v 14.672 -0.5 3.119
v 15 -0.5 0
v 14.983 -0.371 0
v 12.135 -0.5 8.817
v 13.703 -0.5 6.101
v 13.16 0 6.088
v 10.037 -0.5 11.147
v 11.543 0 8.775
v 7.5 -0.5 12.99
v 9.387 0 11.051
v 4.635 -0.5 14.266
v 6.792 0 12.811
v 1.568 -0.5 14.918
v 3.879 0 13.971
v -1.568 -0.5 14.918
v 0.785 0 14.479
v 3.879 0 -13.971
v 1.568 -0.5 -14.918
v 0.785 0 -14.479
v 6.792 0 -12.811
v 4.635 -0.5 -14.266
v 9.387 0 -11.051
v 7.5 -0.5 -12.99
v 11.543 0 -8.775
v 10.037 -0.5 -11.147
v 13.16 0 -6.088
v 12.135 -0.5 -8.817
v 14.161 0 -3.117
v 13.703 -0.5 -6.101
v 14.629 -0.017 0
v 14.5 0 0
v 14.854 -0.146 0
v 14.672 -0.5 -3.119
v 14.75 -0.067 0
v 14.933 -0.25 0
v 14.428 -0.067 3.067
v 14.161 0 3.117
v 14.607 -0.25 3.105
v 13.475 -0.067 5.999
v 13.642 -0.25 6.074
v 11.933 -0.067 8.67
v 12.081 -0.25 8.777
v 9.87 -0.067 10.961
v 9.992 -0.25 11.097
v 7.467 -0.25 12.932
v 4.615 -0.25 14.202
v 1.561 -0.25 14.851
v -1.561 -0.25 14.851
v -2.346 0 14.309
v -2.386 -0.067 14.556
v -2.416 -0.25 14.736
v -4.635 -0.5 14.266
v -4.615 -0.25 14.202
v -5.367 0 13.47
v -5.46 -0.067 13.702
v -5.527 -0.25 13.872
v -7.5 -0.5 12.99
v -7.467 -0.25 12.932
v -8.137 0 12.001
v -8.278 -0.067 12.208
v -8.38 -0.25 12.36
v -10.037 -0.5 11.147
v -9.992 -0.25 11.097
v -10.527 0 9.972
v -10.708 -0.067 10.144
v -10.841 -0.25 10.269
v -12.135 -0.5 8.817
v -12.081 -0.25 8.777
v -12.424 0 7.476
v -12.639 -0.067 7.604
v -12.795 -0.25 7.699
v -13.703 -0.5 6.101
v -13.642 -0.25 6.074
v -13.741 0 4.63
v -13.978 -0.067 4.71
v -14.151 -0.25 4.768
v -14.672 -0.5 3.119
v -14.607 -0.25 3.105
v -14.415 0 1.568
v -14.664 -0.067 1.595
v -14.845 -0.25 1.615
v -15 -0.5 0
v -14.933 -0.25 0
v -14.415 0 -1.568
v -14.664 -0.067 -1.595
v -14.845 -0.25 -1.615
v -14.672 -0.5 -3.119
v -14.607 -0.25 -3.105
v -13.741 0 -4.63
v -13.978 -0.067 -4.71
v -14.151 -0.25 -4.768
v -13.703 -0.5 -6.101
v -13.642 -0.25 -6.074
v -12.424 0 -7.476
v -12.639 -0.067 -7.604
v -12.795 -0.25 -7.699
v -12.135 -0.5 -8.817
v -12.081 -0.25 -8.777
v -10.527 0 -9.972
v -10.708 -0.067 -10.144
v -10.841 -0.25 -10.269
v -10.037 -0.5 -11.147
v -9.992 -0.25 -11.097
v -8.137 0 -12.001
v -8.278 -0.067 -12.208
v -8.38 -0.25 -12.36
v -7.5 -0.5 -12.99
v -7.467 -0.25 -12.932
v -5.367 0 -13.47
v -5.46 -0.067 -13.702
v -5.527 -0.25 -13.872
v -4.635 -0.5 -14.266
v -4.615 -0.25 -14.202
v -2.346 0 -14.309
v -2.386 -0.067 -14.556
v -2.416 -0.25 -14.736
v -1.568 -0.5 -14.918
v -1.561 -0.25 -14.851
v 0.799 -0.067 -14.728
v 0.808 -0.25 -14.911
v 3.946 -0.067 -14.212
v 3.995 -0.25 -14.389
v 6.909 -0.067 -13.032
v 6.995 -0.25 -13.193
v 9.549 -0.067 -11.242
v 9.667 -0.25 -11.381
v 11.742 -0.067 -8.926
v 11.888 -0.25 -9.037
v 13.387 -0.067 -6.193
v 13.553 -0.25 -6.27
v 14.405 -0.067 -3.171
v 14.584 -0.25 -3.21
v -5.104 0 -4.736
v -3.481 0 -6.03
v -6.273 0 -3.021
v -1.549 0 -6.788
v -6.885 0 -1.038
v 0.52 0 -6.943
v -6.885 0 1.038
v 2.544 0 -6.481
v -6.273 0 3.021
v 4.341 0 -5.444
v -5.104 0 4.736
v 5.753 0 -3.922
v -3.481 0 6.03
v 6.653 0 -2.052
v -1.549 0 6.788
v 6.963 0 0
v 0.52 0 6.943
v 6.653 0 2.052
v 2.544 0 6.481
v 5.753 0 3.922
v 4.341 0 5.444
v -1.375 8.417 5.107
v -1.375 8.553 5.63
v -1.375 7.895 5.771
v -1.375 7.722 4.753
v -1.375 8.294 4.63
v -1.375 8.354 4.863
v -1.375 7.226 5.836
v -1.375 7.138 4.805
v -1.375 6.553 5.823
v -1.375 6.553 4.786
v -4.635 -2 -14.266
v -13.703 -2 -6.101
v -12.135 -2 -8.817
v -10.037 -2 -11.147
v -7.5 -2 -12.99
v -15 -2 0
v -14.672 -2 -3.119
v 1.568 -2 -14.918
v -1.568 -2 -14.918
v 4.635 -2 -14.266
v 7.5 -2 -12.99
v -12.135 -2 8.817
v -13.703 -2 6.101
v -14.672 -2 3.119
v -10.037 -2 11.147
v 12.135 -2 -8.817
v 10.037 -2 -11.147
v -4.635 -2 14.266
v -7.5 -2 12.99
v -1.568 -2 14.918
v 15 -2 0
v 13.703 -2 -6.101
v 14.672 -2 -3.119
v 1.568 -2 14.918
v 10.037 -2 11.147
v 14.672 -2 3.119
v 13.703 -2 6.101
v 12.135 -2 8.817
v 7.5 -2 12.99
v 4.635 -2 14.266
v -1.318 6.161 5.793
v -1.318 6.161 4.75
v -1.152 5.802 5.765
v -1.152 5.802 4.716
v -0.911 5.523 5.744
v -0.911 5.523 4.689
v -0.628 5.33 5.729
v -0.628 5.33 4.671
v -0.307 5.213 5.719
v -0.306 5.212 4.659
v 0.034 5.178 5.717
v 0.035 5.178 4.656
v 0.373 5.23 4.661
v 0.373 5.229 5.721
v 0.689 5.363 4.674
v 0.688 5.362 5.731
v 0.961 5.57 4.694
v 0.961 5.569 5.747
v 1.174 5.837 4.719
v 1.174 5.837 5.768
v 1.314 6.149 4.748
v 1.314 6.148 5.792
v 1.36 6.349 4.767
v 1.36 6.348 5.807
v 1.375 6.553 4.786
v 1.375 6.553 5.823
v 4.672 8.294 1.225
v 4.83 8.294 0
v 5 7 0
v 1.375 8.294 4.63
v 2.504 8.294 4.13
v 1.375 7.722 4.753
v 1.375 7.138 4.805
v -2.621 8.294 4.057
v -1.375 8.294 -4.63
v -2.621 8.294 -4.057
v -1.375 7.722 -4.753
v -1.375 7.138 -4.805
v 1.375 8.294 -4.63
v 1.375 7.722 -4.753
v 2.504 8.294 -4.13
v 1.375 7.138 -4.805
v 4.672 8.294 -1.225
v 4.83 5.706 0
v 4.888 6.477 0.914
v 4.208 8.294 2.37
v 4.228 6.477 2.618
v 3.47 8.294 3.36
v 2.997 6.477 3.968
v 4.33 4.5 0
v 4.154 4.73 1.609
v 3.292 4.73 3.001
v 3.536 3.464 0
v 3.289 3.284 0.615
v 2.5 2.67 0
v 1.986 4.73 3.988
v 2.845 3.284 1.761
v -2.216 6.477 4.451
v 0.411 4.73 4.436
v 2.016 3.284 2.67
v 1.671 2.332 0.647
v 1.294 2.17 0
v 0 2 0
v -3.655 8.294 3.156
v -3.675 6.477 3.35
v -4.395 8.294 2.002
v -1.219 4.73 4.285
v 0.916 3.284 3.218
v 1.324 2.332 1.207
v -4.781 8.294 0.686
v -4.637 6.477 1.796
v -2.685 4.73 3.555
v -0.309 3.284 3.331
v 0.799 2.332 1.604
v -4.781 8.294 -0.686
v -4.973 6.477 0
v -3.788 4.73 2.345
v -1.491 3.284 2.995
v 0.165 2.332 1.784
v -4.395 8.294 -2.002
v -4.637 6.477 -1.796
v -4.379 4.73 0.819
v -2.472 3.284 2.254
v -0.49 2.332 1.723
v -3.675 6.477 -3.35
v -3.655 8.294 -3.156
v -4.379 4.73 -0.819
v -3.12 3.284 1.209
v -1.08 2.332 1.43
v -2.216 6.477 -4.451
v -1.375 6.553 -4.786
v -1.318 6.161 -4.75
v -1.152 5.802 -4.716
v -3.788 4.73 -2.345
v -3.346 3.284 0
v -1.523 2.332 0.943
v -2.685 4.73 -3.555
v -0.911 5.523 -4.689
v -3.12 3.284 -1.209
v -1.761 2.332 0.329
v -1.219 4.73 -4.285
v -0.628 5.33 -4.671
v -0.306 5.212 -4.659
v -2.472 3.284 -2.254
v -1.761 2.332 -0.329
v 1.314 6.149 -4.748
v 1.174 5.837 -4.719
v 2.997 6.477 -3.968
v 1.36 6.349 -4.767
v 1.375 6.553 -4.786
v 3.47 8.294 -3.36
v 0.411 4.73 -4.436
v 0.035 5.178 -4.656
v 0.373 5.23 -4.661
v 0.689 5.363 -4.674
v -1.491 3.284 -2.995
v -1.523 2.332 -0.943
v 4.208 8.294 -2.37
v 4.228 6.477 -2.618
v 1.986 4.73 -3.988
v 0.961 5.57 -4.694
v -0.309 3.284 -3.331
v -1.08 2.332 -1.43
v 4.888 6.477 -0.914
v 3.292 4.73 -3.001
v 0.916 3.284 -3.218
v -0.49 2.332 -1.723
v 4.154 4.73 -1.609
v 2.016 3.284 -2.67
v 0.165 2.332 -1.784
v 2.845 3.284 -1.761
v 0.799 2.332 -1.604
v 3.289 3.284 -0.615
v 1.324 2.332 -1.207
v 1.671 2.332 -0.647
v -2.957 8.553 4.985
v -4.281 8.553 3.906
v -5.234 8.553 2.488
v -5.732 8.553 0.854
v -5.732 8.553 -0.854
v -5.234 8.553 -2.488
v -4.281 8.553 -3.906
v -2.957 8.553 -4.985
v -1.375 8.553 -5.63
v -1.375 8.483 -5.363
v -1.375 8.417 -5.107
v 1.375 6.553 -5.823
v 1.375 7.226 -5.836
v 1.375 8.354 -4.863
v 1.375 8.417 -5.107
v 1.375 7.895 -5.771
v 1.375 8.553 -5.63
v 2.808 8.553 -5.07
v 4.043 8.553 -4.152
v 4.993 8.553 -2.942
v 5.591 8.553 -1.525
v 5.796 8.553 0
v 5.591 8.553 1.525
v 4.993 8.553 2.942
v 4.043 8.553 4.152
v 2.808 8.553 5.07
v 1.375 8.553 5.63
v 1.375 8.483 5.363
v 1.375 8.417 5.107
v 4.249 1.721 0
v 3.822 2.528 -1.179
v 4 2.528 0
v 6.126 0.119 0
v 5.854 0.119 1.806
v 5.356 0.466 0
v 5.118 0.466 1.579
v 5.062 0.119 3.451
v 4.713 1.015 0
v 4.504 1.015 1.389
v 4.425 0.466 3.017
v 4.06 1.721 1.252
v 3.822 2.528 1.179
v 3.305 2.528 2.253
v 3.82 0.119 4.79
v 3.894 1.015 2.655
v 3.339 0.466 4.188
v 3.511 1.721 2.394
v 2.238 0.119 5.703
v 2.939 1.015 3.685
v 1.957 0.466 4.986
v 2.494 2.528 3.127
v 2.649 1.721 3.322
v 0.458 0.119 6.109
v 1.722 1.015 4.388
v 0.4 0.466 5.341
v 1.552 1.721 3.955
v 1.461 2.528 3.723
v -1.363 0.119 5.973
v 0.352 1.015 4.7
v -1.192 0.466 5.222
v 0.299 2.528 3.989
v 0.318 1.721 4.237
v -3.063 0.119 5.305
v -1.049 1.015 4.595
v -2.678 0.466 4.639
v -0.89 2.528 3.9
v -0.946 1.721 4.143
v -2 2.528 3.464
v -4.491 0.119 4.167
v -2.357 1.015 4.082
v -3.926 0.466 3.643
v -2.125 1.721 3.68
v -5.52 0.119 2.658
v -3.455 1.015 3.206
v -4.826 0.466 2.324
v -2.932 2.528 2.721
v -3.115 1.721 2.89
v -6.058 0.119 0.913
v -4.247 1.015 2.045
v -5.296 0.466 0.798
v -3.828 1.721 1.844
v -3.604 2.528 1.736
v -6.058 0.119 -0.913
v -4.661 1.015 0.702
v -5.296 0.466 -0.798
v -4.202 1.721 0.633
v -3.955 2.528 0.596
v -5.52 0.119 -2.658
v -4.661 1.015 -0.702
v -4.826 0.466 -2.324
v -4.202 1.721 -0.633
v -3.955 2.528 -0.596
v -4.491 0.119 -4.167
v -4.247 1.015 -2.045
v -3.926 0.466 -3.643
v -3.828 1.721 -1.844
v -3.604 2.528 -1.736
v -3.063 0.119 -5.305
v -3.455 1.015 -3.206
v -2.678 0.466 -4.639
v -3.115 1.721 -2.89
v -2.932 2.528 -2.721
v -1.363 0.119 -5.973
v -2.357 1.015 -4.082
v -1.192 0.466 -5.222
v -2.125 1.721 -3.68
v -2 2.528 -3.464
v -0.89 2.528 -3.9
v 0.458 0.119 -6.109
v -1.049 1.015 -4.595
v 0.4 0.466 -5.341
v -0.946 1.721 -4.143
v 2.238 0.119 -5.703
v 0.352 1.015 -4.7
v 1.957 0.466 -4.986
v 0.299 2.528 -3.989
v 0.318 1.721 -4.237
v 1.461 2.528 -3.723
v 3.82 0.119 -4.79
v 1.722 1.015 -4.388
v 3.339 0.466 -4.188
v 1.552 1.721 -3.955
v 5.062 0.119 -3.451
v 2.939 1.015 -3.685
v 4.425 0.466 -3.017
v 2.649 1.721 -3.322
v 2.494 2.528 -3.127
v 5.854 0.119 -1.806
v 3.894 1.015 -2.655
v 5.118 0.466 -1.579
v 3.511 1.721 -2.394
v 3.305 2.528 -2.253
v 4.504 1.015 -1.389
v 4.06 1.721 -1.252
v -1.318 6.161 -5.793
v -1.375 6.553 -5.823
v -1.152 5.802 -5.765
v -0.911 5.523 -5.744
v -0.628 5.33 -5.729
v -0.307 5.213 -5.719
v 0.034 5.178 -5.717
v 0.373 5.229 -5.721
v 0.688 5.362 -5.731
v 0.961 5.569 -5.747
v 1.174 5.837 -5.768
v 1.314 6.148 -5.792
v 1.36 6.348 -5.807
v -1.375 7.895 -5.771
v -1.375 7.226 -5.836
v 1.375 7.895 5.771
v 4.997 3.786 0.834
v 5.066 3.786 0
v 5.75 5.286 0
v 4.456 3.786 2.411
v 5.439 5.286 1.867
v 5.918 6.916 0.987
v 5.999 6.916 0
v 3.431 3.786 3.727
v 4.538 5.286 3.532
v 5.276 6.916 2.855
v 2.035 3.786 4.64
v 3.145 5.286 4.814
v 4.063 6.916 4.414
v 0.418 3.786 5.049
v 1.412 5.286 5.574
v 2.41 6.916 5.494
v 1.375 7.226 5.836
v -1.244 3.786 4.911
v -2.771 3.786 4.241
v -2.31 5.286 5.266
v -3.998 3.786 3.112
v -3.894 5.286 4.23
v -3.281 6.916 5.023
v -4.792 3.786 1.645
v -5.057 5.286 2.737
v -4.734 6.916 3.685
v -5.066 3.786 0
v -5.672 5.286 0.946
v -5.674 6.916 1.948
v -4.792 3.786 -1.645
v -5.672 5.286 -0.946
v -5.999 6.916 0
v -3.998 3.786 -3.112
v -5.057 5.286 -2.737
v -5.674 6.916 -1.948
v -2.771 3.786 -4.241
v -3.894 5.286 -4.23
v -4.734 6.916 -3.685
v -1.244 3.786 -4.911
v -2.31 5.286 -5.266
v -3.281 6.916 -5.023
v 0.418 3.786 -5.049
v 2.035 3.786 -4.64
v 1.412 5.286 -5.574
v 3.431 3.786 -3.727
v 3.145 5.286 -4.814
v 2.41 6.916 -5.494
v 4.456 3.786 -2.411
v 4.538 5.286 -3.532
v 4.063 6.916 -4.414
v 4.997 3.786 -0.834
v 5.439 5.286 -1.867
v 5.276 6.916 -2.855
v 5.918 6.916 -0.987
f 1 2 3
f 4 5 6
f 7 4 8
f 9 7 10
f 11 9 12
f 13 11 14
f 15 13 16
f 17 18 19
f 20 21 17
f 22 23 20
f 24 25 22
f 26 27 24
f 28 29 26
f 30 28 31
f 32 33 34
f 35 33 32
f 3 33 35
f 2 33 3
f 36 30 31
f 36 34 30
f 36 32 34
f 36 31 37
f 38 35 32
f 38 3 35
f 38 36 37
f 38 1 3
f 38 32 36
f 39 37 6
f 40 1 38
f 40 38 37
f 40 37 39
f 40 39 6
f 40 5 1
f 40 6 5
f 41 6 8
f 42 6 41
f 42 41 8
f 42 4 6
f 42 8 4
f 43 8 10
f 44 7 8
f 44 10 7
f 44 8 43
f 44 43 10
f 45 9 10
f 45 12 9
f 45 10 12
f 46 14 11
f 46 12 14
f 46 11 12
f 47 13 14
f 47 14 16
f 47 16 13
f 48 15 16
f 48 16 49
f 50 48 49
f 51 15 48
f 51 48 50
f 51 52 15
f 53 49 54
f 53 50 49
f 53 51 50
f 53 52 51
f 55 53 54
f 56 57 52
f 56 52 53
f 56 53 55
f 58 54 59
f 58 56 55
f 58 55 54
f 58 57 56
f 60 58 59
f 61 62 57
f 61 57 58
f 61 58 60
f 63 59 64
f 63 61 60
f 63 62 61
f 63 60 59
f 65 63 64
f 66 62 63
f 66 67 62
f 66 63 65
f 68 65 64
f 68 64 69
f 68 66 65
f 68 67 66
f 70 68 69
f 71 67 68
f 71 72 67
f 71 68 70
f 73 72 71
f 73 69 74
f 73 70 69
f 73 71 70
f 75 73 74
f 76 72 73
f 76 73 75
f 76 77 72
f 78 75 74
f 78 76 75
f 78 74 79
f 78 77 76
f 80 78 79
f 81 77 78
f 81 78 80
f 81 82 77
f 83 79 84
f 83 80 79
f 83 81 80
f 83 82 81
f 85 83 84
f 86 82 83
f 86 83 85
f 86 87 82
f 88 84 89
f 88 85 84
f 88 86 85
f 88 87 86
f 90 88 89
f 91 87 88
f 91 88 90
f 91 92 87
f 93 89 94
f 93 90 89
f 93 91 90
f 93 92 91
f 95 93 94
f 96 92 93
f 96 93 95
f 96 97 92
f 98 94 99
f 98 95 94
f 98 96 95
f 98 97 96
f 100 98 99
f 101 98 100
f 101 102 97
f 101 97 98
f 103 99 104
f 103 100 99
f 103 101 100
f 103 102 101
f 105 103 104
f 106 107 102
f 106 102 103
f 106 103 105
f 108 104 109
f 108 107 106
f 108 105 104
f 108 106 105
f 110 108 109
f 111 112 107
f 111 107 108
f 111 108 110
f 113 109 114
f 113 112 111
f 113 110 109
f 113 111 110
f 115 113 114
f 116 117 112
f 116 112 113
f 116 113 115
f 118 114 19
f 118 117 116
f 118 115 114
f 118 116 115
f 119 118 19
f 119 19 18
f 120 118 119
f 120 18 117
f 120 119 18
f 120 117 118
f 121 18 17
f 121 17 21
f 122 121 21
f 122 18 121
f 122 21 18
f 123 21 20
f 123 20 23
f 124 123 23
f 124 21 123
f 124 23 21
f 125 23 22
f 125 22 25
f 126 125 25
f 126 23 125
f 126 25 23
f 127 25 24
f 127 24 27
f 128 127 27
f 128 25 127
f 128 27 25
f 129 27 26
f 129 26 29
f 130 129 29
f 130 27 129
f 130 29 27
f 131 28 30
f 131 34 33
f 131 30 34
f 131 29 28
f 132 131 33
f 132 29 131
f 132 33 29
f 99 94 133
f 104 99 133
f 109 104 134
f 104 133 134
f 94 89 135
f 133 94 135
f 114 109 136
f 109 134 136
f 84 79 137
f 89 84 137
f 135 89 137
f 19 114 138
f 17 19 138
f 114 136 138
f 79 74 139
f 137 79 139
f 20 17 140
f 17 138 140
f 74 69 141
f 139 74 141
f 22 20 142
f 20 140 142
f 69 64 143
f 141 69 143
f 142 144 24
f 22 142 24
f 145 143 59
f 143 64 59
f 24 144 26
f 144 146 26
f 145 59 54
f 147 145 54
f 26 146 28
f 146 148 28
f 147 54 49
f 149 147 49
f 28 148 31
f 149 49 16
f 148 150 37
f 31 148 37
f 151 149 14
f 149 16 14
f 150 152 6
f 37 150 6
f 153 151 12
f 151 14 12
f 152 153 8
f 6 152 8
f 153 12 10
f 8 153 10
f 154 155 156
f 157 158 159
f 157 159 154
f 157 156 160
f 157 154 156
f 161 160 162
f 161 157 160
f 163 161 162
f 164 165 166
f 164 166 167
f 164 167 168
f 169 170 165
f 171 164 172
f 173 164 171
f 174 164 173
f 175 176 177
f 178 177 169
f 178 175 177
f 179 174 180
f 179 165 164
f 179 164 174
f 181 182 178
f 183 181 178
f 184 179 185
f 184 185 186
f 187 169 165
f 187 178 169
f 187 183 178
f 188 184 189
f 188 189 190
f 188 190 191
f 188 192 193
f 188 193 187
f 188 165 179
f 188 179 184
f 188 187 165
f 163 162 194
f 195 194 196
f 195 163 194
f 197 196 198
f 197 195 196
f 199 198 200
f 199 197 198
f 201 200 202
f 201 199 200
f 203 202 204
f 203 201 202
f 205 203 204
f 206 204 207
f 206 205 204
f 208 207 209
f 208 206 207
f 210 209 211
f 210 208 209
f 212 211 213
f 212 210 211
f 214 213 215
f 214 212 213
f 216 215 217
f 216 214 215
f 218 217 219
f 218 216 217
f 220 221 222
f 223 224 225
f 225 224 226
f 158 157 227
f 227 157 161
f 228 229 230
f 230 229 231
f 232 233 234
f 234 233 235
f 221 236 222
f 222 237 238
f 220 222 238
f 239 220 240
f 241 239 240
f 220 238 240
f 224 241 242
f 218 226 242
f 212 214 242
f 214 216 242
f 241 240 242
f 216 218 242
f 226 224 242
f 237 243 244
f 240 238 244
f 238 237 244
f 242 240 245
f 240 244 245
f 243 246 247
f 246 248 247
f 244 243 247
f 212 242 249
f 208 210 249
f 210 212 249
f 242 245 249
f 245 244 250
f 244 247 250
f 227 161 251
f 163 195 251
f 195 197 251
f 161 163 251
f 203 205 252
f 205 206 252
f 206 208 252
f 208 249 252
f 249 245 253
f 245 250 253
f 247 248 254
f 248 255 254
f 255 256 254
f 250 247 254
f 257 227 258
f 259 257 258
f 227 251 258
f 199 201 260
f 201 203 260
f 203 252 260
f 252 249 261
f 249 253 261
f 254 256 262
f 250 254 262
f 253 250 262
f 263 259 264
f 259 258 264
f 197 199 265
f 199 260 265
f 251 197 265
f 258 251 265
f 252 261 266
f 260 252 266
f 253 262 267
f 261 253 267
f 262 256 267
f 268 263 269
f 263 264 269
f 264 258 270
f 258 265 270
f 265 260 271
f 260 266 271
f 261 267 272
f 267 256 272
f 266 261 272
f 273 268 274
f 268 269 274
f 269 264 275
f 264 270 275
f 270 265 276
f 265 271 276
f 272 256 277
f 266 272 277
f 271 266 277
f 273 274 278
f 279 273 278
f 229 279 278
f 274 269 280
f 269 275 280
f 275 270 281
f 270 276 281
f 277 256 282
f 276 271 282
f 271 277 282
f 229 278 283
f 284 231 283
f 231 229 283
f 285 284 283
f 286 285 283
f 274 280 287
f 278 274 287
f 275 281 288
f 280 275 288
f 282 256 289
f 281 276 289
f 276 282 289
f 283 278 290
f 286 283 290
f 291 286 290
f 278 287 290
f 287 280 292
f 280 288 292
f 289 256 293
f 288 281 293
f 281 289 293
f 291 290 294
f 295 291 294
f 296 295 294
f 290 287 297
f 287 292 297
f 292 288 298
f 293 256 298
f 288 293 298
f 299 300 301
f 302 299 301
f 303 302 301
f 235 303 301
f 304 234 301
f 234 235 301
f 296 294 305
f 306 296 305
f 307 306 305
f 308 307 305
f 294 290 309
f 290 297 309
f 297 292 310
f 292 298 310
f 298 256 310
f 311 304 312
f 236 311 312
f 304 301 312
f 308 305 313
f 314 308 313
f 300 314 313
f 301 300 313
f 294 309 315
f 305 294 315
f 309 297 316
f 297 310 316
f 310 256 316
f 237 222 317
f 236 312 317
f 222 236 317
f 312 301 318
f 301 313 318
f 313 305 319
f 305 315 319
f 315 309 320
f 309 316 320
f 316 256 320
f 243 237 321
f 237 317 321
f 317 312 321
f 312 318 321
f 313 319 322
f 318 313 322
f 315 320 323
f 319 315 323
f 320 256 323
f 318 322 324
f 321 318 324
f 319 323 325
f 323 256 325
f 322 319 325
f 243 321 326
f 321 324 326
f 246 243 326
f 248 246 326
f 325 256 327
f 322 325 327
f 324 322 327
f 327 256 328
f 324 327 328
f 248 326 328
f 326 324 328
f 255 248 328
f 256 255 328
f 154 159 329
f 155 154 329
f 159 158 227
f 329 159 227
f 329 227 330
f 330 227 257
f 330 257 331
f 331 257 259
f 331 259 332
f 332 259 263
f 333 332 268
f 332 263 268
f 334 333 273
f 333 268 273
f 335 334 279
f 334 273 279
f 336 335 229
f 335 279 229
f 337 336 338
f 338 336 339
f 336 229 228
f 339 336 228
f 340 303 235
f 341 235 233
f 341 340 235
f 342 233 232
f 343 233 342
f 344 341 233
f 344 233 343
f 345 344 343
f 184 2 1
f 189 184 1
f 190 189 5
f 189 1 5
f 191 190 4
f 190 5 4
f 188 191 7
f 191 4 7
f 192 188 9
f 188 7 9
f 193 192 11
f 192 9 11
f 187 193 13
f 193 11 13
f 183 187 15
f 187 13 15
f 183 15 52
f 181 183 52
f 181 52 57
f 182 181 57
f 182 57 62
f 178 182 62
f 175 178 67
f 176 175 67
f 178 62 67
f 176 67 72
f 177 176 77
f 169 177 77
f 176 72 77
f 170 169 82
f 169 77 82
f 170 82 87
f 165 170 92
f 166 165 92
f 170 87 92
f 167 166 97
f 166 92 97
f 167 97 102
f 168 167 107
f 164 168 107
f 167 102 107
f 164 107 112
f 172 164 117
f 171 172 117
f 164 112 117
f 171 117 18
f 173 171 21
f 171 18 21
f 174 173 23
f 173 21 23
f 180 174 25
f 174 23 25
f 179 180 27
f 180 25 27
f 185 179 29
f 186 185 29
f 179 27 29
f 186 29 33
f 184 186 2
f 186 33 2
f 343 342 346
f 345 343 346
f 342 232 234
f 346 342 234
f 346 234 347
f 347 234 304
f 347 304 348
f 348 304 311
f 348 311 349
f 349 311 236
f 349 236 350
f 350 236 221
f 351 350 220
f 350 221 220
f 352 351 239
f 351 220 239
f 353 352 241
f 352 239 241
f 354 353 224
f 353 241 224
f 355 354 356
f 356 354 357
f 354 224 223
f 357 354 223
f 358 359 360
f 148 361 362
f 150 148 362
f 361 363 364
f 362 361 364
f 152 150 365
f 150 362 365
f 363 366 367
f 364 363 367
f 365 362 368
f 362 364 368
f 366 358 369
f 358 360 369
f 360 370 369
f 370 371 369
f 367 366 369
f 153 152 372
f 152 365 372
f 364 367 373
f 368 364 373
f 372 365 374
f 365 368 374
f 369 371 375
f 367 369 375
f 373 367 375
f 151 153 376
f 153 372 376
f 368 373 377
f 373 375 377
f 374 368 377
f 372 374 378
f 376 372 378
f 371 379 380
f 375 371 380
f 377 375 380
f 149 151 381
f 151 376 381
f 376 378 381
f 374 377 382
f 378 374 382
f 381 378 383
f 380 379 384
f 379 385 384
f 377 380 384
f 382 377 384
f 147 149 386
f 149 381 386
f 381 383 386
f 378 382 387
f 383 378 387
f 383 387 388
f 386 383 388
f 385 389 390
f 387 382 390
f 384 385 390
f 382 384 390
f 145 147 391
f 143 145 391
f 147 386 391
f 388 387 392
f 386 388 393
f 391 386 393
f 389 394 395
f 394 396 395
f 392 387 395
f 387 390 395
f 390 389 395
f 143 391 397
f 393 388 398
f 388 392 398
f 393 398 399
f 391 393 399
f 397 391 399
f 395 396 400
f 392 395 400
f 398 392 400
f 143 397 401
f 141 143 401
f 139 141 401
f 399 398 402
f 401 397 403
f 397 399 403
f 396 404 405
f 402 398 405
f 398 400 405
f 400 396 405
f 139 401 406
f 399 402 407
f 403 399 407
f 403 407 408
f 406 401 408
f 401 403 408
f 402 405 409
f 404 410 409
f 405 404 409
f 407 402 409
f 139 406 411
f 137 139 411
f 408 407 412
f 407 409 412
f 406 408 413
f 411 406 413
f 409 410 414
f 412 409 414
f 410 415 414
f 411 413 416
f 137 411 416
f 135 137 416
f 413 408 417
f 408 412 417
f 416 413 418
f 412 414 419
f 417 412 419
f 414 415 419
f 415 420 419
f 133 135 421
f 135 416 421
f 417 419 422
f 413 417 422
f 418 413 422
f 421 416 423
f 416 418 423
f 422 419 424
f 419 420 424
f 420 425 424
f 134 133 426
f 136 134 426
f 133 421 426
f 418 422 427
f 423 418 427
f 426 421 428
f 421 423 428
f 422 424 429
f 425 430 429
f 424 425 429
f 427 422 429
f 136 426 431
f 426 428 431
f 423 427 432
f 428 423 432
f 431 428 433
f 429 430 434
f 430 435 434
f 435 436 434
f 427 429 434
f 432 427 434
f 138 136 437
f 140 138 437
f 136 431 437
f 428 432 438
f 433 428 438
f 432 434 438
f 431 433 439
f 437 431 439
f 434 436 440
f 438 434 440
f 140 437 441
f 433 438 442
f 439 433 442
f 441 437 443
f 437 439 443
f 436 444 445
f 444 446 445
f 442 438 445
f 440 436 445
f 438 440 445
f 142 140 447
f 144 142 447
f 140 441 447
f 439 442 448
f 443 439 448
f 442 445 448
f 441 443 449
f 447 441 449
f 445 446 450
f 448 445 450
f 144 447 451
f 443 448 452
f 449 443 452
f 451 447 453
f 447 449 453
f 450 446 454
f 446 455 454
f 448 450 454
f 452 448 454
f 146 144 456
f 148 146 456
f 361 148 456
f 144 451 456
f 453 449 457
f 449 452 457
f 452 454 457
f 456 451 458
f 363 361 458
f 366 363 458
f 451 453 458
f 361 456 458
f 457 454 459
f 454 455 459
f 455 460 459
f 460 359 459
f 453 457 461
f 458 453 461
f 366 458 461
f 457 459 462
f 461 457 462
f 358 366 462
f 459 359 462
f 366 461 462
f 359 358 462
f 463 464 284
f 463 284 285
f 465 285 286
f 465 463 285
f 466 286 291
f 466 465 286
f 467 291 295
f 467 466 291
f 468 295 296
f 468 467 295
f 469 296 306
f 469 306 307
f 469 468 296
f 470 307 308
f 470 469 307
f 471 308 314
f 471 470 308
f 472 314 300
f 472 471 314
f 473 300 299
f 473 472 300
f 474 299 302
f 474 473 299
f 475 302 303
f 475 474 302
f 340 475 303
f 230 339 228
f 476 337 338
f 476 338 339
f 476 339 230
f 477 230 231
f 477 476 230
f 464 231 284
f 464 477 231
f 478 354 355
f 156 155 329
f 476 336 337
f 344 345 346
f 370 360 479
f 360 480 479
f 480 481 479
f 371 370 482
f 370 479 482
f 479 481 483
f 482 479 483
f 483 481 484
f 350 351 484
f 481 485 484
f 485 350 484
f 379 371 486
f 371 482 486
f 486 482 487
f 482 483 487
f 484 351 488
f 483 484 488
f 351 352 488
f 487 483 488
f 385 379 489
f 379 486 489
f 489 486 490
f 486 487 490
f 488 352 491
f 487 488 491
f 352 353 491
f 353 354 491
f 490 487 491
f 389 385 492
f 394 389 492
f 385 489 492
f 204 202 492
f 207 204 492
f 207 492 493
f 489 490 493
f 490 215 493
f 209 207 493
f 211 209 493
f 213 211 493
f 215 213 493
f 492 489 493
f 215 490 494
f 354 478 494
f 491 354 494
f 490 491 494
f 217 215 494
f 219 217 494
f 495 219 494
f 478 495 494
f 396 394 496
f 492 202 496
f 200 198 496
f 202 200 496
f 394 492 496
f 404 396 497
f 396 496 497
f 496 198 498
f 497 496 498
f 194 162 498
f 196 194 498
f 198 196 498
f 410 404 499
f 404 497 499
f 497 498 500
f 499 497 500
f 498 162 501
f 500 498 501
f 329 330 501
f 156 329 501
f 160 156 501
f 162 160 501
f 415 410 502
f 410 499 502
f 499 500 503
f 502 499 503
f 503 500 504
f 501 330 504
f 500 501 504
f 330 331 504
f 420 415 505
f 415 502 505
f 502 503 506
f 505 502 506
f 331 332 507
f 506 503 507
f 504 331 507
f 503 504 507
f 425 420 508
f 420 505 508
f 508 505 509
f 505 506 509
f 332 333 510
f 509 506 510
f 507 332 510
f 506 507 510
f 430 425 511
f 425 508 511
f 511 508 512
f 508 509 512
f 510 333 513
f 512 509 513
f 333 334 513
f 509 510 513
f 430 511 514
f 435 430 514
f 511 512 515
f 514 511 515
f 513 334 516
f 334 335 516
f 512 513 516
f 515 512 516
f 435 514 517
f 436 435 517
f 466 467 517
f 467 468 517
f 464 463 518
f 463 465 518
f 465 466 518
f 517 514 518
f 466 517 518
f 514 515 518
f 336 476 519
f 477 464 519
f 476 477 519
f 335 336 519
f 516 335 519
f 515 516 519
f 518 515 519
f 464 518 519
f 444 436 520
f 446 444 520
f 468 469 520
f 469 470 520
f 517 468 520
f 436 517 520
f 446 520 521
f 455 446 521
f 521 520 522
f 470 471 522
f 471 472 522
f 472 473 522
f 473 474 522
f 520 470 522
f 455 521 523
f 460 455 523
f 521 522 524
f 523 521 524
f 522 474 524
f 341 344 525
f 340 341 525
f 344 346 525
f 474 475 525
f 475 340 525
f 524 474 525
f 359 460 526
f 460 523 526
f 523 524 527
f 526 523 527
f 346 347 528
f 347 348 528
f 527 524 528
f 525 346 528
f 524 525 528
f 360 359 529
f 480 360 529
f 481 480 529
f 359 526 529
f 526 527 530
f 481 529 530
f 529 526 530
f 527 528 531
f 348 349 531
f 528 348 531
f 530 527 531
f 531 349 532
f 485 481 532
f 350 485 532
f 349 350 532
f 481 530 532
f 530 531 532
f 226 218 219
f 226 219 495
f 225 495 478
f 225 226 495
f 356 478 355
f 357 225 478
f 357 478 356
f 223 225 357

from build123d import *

# Parameters (mm, degrees)
SKETCH3_R               = 15
BOSS_EXTRUDE1_DEPTH     = 2
CUT_EXTRUDE1_DEPTH      = 23.872523746
CUT_EXTRUDE1_DEPTH_BACK = 23.872523746
FILLET1_R               = 3
FILLET2_R               = 0.5


with BuildPart() as part:
    # Sketch2 → Revolve2 (revolve)
    with BuildSketch(Plane.XY):
        with BuildLine():
            Line((0, 0), (4, 0))
            Line((4, 0), (4, 2.527864045))
            ThreePointArc((4, 2.527864045), (5.75008972, 5.28638738), (5.795554958, 8.552914271))
            Line((5.795554958, 8.552914271), (4.829629131, 8.294095226))
            ThreePointArc((4.829629131, 8.294095226), (3.966766701, 3.956192855), (0, 2))
            Line((0, 2), (0, 0))
        make_face()
    revolve(axis=Axis((0, 2, 0), (0, -1, 0)))

    # Sketch3 → Boss-Extrude1 (add)
    with BuildSketch(Plane.XZ):
        Circle(SKETCH3_R)
    extrude(amount=BOSS_EXTRUDE1_DEPTH)

    # Sketch6 → Cut-Extrude1 (cut, two sides: drawn at the far end of the back side and taken through both)
    with BuildSketch(Plane.XY.offset(-CUT_EXTRUDE1_DEPTH_BACK)):
        with BuildLine():
            Line((1.375, 6.552914271), (1.375, 8.552914271))
            Line((1.375, 8.552914271), (-1.375, 8.552914271))
            Line((-1.375, 8.552914271), (-1.375, 6.552914271))
            ThreePointArc((-1.375, 6.552914271), (0, 5.177914271), (1.375, 6.552914271))
        make_face()
    extrude(amount=CUT_EXTRUDE1_DEPTH + CUT_EXTRUDE1_DEPTH_BACK, mode=Mode.SUBTRACT)

    # Fillet1
    # the kernel refuses this fillet: 3 mm, written as the material it adds along each edge
    with BuildSketch(Plane(origin=(0, 0, 0), x_dir=(1, 0, 0), z_dir=(0, 0, -1))) as fillet1_piece_1:
        with BuildLine():
            CenterArc((6.962615, -3), FILLET1_R, 90, 80.945223599)
            Line((4, -2.527864045), (3.9407477, -2.518421326))
            ThreePointArc((3.9407477, -2.518421326), (3.94, -1.263932023), (3.94, 0))
            Line((3.94, 0), (4, 0.06))
            Line((4, 0.06), (6.962615, 0.06))
            Line((6.962615, 0.06), (6.962615, 0))
        make_face()
    revolve(axis=Axis((0, 0, 0), (0, -1, 0)))

    # Fillet2
    fillet2_edges = [part.edges().sort_by_distance(p)[0] for p in [
        (-15, 0, 0),
    ]]
    fillet(fillet2_edges, radius=FILLET2_R)


solid = part.part
